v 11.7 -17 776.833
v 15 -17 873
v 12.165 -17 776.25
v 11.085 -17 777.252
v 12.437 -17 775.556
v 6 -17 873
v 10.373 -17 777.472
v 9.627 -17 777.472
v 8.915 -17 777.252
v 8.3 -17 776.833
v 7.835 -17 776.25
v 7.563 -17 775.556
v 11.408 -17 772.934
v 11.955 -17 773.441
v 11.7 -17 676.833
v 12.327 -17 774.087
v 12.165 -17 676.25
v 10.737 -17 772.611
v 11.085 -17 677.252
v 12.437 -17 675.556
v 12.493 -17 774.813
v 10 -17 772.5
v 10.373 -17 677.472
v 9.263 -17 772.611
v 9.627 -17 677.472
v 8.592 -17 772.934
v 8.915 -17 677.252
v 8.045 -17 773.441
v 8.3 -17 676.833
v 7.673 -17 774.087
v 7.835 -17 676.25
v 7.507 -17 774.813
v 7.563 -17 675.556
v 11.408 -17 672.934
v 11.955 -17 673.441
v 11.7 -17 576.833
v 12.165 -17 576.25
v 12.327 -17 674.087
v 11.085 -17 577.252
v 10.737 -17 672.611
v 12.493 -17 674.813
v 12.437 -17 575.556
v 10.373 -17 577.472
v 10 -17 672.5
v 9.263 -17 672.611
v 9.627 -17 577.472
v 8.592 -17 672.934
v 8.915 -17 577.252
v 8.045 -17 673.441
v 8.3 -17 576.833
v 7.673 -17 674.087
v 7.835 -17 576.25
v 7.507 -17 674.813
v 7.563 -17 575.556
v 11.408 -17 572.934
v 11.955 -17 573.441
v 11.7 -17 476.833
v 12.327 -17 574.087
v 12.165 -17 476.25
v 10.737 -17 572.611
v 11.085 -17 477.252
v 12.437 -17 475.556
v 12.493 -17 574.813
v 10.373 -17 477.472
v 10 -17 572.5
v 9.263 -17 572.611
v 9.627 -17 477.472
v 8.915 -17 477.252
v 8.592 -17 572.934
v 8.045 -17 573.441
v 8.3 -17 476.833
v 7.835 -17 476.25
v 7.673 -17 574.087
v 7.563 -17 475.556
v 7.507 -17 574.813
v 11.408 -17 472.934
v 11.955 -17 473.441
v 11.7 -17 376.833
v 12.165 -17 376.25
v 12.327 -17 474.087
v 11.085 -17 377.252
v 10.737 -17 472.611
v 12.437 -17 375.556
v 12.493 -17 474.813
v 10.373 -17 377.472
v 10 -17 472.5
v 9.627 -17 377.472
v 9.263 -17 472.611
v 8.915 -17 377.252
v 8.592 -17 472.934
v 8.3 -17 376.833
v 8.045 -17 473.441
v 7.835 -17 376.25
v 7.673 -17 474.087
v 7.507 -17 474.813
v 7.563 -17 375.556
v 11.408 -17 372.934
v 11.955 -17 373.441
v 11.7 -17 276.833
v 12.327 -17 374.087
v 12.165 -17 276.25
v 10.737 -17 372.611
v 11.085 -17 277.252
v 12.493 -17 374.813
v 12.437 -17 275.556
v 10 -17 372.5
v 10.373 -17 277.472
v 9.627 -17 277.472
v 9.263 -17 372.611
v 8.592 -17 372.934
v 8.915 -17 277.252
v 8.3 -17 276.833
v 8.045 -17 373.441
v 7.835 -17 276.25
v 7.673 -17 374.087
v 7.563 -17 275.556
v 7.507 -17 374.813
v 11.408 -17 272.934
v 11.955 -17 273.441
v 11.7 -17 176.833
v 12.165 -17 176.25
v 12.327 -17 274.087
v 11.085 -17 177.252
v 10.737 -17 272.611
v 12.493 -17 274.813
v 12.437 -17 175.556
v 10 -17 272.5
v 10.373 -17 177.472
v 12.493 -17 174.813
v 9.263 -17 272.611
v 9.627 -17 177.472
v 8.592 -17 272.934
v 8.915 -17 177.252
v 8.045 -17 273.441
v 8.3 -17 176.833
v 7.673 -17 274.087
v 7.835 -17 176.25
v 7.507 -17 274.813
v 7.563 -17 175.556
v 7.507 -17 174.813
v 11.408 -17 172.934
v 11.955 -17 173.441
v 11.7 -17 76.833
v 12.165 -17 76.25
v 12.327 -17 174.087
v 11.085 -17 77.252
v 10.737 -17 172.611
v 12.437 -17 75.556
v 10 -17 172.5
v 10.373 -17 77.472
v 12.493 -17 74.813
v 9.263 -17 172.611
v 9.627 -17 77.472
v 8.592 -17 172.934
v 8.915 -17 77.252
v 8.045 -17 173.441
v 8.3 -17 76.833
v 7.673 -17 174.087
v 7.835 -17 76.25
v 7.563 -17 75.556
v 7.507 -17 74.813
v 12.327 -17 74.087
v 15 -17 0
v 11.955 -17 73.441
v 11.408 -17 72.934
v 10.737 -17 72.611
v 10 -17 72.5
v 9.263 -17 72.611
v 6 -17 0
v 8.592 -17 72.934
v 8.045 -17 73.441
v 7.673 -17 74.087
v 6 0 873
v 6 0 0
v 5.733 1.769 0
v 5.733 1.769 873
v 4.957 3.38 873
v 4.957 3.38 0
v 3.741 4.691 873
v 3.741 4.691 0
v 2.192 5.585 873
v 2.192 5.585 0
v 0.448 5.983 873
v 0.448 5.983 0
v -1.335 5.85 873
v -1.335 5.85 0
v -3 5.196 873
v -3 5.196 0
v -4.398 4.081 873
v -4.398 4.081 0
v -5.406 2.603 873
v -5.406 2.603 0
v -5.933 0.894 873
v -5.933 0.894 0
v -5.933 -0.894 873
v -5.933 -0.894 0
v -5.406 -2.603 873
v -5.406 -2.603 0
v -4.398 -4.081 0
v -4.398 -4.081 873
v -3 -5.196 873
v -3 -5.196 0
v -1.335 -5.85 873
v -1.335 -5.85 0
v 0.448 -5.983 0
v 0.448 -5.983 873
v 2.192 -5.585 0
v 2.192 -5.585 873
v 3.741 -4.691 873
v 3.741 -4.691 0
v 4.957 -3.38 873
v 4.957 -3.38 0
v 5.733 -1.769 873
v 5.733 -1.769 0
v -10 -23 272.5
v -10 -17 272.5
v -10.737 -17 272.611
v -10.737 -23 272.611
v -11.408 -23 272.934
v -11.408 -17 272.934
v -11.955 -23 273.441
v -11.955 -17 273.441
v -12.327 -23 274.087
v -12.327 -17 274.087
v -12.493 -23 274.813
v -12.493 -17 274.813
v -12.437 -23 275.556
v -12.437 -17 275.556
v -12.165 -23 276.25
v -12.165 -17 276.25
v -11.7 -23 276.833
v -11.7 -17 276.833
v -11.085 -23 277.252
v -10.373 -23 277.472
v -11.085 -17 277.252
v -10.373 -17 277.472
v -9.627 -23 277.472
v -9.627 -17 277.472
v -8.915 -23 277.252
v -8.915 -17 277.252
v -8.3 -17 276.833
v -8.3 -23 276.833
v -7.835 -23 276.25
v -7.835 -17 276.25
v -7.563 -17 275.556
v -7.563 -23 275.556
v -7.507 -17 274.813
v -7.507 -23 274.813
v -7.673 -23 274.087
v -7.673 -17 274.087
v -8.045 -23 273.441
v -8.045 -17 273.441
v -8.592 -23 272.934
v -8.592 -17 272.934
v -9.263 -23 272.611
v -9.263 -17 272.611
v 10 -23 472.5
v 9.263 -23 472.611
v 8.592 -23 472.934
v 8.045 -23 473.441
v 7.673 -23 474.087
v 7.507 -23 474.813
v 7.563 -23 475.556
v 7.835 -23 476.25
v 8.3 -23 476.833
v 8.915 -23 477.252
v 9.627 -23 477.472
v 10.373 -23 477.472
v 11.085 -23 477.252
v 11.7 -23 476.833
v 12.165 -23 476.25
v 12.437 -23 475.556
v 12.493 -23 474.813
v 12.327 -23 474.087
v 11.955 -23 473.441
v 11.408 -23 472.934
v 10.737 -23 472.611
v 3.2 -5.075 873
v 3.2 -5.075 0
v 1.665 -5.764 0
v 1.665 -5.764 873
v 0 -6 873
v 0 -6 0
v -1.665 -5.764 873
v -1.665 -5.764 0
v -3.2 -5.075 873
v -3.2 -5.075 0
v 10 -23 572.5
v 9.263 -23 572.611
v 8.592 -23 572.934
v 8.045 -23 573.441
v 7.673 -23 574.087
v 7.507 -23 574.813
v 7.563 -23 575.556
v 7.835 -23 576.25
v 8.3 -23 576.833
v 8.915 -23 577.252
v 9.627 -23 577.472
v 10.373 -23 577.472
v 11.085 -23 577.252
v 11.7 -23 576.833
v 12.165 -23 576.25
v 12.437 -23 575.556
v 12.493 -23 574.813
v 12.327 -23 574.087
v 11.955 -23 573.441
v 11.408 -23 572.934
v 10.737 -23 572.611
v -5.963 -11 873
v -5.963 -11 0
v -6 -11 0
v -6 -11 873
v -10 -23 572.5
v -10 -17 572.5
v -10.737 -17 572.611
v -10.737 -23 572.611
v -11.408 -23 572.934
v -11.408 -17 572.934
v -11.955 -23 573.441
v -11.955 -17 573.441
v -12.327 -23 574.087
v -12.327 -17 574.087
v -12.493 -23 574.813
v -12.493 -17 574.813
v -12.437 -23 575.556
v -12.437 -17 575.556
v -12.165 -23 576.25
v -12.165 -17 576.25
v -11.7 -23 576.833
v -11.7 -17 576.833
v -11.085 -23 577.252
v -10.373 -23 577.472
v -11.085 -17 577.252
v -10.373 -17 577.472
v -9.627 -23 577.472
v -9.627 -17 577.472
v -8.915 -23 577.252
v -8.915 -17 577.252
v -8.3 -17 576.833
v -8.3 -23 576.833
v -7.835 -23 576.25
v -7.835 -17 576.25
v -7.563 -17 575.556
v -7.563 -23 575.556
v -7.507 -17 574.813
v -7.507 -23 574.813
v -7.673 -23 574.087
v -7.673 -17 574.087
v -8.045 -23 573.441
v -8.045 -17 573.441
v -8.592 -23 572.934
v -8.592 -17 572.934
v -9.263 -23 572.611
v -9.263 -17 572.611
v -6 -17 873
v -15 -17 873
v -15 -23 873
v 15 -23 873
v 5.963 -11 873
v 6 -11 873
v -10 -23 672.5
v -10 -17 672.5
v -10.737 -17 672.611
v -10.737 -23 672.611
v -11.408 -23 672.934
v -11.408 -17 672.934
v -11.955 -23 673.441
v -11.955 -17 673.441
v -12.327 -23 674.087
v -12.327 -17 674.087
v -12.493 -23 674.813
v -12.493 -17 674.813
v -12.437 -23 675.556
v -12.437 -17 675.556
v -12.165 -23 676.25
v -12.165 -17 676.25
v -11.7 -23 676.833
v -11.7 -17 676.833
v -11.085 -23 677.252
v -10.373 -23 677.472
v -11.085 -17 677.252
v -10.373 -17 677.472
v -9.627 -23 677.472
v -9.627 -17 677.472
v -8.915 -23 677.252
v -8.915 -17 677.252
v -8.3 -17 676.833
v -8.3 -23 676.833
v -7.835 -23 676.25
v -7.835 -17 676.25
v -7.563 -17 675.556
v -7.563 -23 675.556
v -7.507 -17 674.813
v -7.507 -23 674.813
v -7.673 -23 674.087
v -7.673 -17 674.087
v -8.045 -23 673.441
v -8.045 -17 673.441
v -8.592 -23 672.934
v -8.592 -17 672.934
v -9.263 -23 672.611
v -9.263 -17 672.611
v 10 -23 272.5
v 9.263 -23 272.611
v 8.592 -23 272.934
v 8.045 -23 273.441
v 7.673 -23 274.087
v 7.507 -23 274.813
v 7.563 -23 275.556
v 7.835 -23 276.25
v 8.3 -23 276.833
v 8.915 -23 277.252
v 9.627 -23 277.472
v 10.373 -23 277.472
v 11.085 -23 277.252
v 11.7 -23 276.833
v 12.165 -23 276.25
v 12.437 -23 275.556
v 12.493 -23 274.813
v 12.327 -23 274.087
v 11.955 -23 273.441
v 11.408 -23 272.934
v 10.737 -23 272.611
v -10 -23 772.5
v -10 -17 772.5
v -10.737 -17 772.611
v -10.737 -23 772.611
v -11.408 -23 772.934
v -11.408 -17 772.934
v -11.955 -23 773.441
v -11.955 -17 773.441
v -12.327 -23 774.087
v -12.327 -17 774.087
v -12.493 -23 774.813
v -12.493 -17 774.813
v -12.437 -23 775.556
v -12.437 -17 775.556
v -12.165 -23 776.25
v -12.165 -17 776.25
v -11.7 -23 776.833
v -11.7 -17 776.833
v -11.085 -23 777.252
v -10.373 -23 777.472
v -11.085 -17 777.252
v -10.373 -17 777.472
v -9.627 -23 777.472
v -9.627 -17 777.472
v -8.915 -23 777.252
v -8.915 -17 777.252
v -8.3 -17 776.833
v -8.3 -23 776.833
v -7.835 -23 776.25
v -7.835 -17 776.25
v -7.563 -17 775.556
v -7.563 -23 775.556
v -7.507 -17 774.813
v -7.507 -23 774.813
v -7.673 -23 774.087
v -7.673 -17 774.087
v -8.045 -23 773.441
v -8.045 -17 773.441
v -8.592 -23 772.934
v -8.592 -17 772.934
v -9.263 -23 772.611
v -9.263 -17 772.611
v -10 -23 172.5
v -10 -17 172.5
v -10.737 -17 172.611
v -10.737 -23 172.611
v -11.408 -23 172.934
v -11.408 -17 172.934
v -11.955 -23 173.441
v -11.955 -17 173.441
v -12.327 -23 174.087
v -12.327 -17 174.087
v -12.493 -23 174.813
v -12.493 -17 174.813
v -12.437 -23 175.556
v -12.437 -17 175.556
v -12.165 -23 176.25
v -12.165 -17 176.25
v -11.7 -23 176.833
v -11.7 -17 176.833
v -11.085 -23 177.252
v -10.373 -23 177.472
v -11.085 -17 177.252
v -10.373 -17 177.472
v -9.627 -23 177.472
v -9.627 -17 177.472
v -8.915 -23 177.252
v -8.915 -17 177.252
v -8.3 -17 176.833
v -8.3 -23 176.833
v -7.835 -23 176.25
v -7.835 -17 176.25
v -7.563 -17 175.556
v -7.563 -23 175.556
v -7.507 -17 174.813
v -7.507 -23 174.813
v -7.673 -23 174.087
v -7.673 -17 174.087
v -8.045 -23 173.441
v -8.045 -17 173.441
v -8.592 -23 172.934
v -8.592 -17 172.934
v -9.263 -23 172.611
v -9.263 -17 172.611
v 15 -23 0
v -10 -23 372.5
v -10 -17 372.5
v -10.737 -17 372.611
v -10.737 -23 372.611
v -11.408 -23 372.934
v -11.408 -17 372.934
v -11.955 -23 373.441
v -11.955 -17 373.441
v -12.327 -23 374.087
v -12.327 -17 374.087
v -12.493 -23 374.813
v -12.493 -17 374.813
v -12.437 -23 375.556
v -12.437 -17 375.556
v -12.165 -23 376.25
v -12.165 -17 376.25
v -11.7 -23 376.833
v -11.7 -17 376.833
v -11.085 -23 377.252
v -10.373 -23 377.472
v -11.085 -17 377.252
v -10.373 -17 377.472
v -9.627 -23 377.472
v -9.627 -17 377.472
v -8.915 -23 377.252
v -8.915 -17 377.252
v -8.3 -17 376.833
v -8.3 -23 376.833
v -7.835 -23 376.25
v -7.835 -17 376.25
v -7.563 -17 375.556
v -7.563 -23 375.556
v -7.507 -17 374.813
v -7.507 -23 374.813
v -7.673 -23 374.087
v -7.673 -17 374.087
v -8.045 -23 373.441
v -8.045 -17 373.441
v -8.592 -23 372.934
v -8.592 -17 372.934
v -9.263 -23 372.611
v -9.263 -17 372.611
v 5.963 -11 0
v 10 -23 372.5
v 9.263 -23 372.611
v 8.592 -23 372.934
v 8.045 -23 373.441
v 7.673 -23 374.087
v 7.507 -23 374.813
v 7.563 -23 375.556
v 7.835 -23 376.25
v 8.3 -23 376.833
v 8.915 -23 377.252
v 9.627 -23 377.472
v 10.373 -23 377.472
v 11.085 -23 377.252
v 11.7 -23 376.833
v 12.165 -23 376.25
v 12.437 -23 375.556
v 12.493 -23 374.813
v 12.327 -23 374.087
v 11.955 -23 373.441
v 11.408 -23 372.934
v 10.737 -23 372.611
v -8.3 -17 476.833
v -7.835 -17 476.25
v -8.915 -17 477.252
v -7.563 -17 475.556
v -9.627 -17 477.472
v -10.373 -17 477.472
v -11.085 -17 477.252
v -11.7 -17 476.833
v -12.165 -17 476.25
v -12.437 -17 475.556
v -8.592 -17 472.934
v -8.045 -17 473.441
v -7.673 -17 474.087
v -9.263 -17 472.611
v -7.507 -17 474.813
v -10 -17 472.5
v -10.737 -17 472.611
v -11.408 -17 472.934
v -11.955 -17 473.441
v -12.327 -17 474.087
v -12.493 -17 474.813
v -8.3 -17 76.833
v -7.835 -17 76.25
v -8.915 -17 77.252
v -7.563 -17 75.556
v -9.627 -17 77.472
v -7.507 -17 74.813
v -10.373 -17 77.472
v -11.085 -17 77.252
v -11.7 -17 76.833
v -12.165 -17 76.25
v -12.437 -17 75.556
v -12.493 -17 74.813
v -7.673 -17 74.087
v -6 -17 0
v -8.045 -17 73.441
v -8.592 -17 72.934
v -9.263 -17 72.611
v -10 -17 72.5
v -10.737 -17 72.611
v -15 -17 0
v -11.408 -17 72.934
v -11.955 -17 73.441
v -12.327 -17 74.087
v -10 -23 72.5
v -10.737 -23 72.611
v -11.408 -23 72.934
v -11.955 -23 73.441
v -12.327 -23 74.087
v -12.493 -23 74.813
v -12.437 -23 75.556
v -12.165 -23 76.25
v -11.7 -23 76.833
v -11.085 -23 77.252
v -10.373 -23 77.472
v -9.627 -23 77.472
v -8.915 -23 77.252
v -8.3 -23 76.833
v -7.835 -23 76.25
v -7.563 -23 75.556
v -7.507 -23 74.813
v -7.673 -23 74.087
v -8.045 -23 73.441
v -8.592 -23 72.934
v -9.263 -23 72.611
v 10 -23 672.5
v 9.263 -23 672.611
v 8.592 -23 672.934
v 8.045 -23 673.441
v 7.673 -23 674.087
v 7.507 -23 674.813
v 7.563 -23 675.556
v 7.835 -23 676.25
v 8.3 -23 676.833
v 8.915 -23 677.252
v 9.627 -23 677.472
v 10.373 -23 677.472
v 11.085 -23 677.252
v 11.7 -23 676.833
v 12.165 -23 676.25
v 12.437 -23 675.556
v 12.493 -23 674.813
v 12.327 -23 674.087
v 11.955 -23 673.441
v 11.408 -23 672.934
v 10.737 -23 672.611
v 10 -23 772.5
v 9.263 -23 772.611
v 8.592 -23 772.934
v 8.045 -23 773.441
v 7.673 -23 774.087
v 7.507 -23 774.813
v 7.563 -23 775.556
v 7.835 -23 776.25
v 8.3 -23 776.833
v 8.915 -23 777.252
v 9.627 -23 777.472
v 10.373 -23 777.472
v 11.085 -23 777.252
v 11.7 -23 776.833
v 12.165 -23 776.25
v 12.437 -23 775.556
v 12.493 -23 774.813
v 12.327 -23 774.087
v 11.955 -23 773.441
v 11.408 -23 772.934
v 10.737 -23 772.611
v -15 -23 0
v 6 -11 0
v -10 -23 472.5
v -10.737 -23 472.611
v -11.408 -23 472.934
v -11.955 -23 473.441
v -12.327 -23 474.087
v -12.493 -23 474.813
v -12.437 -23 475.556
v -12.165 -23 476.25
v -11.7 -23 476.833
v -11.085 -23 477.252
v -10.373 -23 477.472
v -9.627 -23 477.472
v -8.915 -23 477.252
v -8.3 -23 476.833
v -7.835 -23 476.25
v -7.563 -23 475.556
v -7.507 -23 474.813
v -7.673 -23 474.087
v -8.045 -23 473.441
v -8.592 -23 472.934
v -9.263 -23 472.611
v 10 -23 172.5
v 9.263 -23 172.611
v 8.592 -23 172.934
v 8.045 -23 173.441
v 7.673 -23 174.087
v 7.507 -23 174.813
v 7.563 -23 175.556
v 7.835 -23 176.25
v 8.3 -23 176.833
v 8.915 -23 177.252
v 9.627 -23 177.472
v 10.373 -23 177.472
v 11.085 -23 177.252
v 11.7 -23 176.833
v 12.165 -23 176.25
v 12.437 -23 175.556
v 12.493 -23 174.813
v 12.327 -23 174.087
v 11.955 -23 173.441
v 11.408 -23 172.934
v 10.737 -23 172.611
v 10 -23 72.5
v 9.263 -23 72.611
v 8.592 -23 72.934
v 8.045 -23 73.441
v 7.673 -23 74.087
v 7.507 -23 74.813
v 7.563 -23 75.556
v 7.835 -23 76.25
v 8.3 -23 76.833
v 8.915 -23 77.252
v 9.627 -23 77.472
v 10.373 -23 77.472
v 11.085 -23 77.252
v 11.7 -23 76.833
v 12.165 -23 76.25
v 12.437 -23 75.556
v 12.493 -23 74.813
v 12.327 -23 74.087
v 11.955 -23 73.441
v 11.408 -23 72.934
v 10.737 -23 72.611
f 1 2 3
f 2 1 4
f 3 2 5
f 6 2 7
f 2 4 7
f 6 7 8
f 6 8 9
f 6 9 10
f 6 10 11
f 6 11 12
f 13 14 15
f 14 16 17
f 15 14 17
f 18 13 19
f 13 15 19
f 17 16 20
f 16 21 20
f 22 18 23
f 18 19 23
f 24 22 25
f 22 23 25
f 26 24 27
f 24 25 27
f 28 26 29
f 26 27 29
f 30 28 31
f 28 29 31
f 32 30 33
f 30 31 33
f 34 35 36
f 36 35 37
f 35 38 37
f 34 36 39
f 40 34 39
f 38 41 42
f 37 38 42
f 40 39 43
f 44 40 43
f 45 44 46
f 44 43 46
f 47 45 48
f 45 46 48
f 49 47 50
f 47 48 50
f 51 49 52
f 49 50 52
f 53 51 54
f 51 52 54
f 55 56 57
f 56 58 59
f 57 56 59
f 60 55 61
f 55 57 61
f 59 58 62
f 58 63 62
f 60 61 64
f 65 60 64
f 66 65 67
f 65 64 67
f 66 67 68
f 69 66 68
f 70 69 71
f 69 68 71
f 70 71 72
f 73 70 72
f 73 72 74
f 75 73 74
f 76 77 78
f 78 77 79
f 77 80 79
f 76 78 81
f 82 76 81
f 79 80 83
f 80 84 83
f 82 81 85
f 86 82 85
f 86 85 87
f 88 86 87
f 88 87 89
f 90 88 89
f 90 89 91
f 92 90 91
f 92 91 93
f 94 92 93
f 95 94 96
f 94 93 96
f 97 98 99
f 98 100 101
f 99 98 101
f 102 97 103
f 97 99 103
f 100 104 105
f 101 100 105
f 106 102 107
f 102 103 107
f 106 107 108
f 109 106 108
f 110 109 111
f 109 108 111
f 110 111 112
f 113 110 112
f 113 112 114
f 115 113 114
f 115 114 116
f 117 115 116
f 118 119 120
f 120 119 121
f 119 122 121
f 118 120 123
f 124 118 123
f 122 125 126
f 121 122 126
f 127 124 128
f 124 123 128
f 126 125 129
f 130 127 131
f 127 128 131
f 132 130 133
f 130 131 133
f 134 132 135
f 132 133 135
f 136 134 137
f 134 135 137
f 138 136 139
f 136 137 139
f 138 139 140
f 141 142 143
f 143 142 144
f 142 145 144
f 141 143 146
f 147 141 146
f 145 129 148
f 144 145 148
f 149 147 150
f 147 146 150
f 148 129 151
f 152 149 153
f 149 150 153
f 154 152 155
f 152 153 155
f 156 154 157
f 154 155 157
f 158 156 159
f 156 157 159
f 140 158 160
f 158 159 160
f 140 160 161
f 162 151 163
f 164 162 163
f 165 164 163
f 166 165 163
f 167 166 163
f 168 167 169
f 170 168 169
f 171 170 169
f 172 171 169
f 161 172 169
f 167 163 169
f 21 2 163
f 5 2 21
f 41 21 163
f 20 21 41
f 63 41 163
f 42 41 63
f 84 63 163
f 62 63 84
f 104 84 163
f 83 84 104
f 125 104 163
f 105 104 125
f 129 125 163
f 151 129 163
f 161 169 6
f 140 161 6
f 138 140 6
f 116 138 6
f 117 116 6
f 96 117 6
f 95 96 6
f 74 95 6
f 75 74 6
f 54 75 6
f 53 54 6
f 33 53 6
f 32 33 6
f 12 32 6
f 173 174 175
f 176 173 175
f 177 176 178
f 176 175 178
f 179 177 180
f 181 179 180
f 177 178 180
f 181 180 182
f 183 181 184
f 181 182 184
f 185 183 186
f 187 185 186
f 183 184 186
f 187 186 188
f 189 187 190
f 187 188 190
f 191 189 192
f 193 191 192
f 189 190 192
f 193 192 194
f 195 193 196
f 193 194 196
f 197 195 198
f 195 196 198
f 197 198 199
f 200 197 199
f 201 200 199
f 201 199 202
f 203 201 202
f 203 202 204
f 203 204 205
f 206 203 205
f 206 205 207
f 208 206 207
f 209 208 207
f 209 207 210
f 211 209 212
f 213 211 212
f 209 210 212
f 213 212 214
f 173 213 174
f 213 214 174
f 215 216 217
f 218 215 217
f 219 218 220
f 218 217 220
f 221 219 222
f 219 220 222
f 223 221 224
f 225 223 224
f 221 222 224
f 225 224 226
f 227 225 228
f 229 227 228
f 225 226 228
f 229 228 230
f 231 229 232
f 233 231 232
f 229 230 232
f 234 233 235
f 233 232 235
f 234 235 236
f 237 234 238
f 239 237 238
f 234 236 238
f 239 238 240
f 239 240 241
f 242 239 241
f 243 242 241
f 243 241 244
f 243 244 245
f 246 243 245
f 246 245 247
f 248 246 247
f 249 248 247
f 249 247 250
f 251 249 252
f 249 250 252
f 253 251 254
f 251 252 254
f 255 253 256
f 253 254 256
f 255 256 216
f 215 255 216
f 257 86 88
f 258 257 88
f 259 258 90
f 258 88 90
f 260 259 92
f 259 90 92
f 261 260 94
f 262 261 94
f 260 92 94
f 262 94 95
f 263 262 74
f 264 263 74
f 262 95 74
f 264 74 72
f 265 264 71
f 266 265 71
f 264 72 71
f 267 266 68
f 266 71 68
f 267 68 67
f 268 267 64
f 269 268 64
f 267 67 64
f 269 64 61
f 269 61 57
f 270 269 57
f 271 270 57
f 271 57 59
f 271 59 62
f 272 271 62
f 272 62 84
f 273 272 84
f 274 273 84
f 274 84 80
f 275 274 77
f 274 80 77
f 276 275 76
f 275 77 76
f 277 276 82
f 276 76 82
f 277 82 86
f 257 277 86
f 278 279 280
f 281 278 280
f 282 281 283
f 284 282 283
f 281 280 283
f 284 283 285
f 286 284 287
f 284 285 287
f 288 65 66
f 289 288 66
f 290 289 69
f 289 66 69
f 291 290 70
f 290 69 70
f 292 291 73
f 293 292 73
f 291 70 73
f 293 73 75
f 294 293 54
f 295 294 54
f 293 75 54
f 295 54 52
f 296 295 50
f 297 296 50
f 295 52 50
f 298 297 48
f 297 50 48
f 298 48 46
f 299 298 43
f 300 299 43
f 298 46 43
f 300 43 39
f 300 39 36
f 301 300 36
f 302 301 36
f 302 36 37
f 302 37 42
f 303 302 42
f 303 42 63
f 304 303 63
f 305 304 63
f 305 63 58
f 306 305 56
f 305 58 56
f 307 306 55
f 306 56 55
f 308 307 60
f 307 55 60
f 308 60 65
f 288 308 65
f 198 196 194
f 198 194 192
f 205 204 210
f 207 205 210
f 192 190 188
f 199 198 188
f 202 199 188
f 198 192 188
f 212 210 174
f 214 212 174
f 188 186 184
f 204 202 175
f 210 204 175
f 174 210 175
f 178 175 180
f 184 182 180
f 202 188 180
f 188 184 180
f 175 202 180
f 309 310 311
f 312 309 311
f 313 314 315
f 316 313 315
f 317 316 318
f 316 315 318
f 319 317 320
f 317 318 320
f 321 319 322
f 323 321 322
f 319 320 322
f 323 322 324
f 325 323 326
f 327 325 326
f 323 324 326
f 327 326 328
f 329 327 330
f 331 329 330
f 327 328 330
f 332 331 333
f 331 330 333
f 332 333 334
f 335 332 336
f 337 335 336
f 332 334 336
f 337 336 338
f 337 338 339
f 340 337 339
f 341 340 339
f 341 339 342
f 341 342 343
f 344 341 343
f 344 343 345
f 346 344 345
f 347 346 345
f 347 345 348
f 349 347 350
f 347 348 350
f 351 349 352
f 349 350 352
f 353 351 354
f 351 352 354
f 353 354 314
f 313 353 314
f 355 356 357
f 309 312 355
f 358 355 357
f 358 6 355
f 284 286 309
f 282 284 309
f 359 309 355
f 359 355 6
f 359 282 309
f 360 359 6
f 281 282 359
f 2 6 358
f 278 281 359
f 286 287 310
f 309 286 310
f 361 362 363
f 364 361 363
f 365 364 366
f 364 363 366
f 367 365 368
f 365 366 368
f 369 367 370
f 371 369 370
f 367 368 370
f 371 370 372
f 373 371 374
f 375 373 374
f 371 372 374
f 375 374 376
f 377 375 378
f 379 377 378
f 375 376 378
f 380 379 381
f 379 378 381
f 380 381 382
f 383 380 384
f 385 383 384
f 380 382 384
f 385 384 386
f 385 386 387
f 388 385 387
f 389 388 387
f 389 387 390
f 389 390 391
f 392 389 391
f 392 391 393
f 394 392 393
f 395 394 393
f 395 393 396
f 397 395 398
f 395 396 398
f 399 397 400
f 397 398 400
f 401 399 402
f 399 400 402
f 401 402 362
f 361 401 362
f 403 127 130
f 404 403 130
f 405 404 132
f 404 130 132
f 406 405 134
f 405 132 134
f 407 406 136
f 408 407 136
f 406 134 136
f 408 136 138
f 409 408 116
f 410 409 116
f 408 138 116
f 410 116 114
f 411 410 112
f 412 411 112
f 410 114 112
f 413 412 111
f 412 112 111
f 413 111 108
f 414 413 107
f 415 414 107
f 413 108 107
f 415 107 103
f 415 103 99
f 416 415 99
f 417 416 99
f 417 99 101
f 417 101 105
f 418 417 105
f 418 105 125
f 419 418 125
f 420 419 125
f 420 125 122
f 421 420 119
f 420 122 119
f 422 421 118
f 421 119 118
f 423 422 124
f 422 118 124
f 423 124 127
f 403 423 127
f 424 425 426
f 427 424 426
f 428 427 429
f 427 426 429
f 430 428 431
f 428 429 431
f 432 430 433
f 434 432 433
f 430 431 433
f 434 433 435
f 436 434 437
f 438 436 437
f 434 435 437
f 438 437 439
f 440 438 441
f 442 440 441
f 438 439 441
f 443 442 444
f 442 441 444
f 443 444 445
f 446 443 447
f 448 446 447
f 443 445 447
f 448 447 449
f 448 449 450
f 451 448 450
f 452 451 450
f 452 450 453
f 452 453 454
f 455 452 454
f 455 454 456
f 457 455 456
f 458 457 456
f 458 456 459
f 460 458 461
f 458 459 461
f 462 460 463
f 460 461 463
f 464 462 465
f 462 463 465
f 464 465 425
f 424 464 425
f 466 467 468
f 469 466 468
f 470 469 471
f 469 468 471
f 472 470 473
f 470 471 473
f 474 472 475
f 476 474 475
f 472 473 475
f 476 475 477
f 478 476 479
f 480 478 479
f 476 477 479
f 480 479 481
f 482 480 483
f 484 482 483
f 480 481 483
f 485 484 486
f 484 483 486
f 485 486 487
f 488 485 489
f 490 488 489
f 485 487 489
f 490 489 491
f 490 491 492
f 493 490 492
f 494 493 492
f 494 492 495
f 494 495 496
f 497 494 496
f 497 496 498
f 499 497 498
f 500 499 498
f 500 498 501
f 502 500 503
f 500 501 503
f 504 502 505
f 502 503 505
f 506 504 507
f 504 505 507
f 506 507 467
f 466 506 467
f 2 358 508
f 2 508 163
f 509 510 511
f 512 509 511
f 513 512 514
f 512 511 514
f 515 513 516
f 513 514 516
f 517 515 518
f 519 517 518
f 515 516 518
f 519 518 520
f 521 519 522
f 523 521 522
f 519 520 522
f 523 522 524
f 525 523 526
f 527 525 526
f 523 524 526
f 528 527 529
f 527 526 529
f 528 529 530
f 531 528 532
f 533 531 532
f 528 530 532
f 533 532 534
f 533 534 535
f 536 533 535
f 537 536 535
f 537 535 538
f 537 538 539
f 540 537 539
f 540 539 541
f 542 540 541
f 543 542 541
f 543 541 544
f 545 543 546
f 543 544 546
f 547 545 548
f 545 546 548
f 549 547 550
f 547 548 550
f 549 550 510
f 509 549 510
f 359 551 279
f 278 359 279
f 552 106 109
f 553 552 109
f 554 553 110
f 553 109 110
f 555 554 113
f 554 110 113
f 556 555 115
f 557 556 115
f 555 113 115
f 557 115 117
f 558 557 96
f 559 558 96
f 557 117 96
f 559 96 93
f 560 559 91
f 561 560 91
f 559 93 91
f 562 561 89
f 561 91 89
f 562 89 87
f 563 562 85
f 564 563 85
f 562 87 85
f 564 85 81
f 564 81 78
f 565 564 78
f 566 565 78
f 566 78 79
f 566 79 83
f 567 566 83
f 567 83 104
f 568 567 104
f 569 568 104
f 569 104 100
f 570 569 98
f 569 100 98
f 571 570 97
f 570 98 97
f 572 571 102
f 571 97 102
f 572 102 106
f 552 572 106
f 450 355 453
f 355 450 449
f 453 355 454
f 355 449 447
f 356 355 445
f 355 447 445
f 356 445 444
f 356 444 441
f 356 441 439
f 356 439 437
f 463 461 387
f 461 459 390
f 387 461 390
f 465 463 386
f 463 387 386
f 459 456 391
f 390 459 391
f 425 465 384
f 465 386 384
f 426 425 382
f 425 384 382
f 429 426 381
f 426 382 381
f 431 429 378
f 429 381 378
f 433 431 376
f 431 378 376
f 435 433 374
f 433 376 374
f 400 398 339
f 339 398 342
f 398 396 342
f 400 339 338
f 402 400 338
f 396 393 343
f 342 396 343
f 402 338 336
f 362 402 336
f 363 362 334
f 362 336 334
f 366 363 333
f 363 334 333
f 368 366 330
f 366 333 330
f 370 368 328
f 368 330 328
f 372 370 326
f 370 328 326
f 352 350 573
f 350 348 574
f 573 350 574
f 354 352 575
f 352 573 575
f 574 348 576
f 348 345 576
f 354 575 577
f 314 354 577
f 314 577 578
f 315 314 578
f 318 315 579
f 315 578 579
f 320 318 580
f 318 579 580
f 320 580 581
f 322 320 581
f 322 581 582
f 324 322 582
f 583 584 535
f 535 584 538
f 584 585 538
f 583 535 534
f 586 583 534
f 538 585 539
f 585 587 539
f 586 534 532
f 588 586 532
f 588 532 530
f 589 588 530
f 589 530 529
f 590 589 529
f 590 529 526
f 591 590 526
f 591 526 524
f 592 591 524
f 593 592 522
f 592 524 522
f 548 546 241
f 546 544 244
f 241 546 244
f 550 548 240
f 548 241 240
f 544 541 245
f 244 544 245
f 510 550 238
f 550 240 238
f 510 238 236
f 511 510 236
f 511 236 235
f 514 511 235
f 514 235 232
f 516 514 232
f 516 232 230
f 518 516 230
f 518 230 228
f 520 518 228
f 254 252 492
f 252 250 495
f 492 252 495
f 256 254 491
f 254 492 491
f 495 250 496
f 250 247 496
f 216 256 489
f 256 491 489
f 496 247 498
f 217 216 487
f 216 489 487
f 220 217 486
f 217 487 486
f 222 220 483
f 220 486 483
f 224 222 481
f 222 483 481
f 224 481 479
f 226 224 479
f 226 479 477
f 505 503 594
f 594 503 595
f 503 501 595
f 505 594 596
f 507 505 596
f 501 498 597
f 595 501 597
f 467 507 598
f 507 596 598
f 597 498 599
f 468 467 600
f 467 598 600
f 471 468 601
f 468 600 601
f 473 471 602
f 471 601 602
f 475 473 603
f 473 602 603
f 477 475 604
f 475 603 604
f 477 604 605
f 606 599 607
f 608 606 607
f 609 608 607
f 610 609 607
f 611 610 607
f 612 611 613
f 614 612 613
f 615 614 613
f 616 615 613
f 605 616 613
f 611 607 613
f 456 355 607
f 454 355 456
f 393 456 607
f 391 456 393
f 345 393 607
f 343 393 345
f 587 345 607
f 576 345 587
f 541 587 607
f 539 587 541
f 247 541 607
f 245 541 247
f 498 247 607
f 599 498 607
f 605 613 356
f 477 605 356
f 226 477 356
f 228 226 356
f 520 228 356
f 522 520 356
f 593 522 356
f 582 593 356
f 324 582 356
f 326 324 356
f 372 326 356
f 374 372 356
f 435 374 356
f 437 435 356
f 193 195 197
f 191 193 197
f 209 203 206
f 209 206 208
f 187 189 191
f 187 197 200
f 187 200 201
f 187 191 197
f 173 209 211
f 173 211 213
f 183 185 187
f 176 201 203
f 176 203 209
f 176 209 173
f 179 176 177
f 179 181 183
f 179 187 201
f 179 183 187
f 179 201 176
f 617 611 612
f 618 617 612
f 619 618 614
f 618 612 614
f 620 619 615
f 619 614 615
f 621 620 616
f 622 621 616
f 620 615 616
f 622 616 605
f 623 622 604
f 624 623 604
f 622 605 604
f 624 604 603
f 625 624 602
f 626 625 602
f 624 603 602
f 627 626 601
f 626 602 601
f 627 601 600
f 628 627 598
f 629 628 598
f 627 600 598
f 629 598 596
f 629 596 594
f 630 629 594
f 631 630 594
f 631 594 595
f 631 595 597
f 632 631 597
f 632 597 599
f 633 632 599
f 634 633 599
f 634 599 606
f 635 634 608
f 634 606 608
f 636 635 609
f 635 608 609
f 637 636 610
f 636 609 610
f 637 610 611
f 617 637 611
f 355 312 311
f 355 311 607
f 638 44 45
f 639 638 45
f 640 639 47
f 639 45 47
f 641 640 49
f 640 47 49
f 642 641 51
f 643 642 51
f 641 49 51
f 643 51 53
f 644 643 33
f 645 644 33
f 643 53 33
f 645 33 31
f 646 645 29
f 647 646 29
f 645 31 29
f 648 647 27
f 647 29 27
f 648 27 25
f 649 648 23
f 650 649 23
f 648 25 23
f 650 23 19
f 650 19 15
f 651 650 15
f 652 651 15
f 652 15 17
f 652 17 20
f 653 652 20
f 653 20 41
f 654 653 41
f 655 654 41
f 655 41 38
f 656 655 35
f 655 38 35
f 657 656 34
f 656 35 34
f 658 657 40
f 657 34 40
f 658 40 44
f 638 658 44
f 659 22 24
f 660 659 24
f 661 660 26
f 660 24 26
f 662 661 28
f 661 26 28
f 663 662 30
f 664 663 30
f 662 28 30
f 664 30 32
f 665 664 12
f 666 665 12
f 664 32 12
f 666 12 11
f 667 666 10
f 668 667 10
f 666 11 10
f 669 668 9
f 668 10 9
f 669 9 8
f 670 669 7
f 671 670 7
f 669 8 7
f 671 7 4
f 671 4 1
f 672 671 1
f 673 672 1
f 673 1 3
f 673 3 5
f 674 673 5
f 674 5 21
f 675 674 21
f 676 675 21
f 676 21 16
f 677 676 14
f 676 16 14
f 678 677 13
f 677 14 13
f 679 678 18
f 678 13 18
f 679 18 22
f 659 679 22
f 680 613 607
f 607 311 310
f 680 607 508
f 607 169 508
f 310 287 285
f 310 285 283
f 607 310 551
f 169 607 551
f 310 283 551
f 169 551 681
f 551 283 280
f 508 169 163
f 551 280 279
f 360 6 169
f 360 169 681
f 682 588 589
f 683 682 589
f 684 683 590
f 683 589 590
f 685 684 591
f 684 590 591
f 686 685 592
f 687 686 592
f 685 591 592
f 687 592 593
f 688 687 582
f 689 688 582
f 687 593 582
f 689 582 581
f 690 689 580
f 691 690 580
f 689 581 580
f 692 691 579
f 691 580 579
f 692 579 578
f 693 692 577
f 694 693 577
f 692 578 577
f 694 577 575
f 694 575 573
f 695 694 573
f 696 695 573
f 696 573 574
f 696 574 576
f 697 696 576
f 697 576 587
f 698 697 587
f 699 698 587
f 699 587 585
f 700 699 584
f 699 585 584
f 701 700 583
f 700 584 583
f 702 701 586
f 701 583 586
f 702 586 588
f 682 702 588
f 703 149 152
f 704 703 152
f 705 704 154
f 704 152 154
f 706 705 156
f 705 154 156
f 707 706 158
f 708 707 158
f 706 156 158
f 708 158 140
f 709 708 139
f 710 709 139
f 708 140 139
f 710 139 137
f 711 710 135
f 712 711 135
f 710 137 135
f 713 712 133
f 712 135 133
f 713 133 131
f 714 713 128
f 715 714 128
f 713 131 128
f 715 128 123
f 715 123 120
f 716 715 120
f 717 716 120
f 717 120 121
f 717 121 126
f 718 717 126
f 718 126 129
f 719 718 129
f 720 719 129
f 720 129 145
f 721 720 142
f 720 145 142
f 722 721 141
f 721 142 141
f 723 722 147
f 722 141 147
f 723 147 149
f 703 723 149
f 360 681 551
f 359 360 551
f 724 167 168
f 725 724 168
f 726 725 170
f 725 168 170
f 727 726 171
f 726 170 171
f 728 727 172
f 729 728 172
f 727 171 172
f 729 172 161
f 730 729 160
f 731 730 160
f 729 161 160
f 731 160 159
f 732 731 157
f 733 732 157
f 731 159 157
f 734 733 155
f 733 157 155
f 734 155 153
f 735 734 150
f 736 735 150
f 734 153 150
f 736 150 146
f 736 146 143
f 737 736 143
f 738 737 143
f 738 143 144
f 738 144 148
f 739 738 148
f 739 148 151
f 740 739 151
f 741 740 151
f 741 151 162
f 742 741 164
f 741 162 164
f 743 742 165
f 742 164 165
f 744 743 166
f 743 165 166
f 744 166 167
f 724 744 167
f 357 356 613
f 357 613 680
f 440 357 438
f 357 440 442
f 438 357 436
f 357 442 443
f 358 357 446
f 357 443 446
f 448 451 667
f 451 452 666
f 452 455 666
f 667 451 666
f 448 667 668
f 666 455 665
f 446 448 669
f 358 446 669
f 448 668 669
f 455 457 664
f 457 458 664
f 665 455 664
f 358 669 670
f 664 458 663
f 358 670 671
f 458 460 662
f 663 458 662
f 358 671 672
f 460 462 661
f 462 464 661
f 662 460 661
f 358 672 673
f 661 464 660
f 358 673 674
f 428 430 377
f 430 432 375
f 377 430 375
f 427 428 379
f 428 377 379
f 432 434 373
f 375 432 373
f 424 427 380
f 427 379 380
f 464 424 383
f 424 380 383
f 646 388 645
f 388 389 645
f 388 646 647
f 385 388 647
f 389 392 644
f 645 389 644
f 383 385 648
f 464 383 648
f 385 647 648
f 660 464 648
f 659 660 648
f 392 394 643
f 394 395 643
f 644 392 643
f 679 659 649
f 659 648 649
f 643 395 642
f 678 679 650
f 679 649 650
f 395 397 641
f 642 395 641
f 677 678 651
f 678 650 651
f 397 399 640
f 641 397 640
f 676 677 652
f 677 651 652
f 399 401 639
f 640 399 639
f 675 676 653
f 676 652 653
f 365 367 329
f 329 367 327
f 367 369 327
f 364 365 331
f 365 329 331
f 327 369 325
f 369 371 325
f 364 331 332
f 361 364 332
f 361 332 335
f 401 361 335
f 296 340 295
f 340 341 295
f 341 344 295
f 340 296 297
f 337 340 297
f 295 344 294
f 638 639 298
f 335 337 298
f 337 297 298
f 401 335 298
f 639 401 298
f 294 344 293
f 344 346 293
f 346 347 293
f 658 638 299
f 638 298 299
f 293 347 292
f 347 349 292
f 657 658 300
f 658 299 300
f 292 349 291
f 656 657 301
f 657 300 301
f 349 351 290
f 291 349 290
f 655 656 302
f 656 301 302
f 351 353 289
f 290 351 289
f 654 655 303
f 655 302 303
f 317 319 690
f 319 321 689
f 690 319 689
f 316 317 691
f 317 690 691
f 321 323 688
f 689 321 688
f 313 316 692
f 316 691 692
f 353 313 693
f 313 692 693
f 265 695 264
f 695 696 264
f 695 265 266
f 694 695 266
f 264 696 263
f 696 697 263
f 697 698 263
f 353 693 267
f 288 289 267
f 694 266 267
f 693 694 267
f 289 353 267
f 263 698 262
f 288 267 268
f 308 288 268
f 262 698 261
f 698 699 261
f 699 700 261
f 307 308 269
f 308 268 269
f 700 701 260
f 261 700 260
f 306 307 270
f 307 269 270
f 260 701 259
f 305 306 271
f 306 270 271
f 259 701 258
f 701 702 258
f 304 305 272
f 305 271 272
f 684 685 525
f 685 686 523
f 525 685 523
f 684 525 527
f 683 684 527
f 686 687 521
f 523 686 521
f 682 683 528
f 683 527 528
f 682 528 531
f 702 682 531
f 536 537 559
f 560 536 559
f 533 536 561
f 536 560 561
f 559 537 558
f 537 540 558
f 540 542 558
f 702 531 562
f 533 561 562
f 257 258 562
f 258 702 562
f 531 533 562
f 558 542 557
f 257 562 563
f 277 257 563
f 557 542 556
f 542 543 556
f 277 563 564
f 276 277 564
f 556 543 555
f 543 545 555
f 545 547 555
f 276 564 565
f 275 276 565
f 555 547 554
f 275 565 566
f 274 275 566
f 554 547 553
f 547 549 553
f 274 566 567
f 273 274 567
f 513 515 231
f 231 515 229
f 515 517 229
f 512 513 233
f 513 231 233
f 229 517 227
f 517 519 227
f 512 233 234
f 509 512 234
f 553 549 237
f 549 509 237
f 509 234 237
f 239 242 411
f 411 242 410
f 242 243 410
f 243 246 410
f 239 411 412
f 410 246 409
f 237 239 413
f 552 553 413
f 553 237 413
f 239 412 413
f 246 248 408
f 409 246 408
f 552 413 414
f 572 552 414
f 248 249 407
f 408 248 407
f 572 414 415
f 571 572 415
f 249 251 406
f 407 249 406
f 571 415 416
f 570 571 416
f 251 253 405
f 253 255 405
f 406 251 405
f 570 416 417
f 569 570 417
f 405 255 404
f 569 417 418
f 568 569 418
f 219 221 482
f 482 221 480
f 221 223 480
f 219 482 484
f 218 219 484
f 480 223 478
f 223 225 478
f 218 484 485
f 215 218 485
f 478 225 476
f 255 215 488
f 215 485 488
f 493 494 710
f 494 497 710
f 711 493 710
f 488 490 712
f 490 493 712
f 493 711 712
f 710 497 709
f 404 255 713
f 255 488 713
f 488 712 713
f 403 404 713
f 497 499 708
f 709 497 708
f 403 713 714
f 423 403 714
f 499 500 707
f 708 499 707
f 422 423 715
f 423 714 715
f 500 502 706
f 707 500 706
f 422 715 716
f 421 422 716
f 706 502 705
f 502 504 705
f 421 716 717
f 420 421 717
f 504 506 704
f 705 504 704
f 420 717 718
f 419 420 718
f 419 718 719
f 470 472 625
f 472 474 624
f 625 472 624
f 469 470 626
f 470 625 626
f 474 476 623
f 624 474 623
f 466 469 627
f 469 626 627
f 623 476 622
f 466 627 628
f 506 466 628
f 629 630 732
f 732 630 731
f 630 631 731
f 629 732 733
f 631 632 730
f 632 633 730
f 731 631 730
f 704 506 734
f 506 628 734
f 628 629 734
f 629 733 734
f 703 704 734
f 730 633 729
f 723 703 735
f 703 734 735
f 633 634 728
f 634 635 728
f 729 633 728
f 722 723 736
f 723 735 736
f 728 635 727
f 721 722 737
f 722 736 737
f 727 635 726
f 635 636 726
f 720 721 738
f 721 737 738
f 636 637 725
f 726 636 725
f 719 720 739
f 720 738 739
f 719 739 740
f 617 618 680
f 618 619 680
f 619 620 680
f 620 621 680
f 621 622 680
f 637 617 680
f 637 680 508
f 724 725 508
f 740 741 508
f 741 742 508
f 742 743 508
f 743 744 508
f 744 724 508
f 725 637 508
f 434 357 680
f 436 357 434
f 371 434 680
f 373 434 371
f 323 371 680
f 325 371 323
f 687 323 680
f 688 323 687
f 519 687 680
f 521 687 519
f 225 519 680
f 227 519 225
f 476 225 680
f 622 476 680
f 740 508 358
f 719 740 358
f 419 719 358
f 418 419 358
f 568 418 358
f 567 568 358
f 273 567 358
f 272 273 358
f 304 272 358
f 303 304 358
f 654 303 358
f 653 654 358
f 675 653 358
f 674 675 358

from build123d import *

# Parameters (mm, degrees)
SBS_PROFILE_R             = 6
STEELRAIL_DEPTH           = 873
ALUMINUMSUPPORT_DEPTH     = 873
HOLEDIA_W                 = 2.5
HOLEDIA_H                 = 6.001
MOUNTHOLES_AT_2_COUNT     = 2
MOUNTHOLES_AT_2_PITCH     = 20
LPATTERN1_COUNT           = 8
LPATTERN1_PITCH           = 100
LPATTERN1_COPY_1_SKETCH_W = 2.5
LPATTERN1_COPY_1_SKETCH_H = 6.001
LPATTERN1_COPY_2_SKETCH_W = 2.5
LPATTERN1_COPY_2_SKETCH_H = 6.001
LPATTERN1_COPY_3_SKETCH_W = 2.5
LPATTERN1_COPY_3_SKETCH_H = 6.001
LPATTERN1_COPY_4_SKETCH_W = 2.5
LPATTERN1_COPY_4_SKETCH_H = 6.001
LPATTERN1_COPY_5_SKETCH_W = 2.5
LPATTERN1_COPY_5_SKETCH_H = 6.001
LPATTERN1_COPY_6_SKETCH_W = 2.5
LPATTERN1_COPY_6_SKETCH_H = 6.001
LPATTERN1_COPY_7_SKETCH_W = 2.5
LPATTERN1_COPY_7_SKETCH_H = 6.001


with BuildPart() as part:
    # SBS-Profile → SteelRail (new body)
    with BuildSketch(Plane.XY):
        Circle(SBS_PROFILE_R)
    extrude(amount=STEELRAIL_DEPTH)


with BuildPart() as body_2:
    # SBS-Profile<3> → AluminumSupport (new body)
    with BuildSketch(Plane.XY):
        with BuildLine():
            Line((-15, -17), (-15, -23))
            Line((-15, -23), (15, -23))
            Line((15, -23), (15, -17))
            Line((15, -17), (6, -17))
            Line((6, -17), (6, -11))
            Line((6, -11), (5.962671888, -11))
            Line((5.962671888, -11), (3.2, -5.075431016))
            ThreePointArc((3.2, -5.075431016), (0, -6), (-3.2, -5.075431016))
            Line((-3.2, -5.075431016), (-5.962671888, -11))
            Line((-5.962671888, -11), (-6, -11))
            Line((-6, -11), (-6, -17))
            Line((-6, -17), (-15, -17))
        make_face()
    extrude(amount=ALUMINUMSUPPORT_DEPTH)

    # HoleDia → MountHoles (revolve, cut)
    with BuildSketch(Plane(origin=(10, -23, 75), x_dir=(0, 0, -1), z_dir=(1, 0, 0))):
        with Locations((1.25, 3.0005)):
            Rectangle(HOLEDIA_W, HOLEDIA_H)
    mountholes = revolve(axis=Axis((10, -29.35, 75), (0, 1, 0)), mode=Mode.SUBTRACT)

    # MountHoles at 2: MountHoles ×2
    with Locations(*[(-i * MOUNTHOLES_AT_2_PITCH, 0, 0) for i in range(1, MOUNTHOLES_AT_2_COUNT)]):
        add(mountholes, mode=Mode.SUBTRACT)

    # LPattern1: MountHoles ×8
    with Locations(*[(0, 0, i * LPATTERN1_PITCH) for i in range(1, LPATTERN1_COUNT)]):
        add(mountholes, mode=Mode.SUBTRACT)

    # LPattern1 copy 1 sketch → LPattern1 copy 1 (revolve, cut)
    with BuildSketch(Plane(origin=(-10, -23, 175), x_dir=(0, 0, -1), z_dir=(1, 0, 0))):
        with Locations((1.25, 3.0005)):
            Rectangle(LPATTERN1_COPY_1_SKETCH_W, LPATTERN1_COPY_1_SKETCH_H)
    revolve(axis=Axis((-10, -29.35, 175), (0, 1, 0)), mode=Mode.SUBTRACT)

    # LPattern1 copy 2 sketch → LPattern1 copy 2 (revolve, cut)
    with BuildSketch(Plane(origin=(-10, -23, 275), x_dir=(0, 0, -1), z_dir=(1, 0, 0))):
        with Locations((1.25, 3.0005)):
            Rectangle(LPATTERN1_COPY_2_SKETCH_W, LPATTERN1_COPY_2_SKETCH_H)
    revolve(axis=Axis((-10, -29.35, 275), (0, 1, 0)), mode=Mode.SUBTRACT)

    # LPattern1 copy 3 sketch → LPattern1 copy 3 (revolve, cut)
    with BuildSketch(Plane(origin=(-10, -23, 375), x_dir=(0, 0, -1), z_dir=(1, 0, 0))):
        with Locations((1.25, 3.0005)):
            Rectangle(LPATTERN1_COPY_3_SKETCH_W, LPATTERN1_COPY_3_SKETCH_H)
    revolve(axis=Axis((-10, -29.35, 375), (0, 1, 0)), mode=Mode.SUBTRACT)

    # LPattern1 copy 4 sketch → LPattern1 copy 4 (revolve, cut)
    with BuildSketch(Plane(origin=(-10, -23, 475), x_dir=(0, 0, -1), z_dir=(1, 0, 0))):
        with Locations((1.25, 3.0005)):
            Rectangle(LPATTERN1_COPY_4_SKETCH_W, LPATTERN1_COPY_4_SKETCH_H)
    revolve(axis=Axis((-10, -29.35, 475), (0, 1, 0)), mode=Mode.SUBTRACT)

    # LPattern1 copy 5 sketch → LPattern1 copy 5 (revolve, cut)
    with BuildSketch(Plane(origin=(-10, -23, 575), x_dir=(0, 0, -1), z_dir=(1, 0, 0))):
        with Locations((1.25, 3.0005)):
            Rectangle(LPATTERN1_COPY_5_SKETCH_W, LPATTERN1_COPY_5_SKETCH_H)
    revolve(axis=Axis((-10, -29.35, 575), (0, 1, 0)), mode=Mode.SUBTRACT)

    # LPattern1 copy 6 sketch → LPattern1 copy 6 (revolve, cut)
    with BuildSketch(Plane(origin=(-10, -23, 675), x_dir=(0, 0, -1), z_dir=(1, 0, 0))):
        with Locations((1.25, 3.0005)):
            Rectangle(LPATTERN1_COPY_6_SKETCH_W, LPATTERN1_COPY_6_SKETCH_H)
    revolve(axis=Axis((-10, -29.35, 675), (0, 1, 0)), mode=Mode.SUBTRACT)

    # LPattern1 copy 7 sketch → LPattern1 copy 7 (revolve, cut)
    with BuildSketch(Plane(origin=(-10, -23, 775), x_dir=(0, 0, -1), z_dir=(1, 0, 0))):
        with Locations((1.25, 3.0005)):
            Rectangle(LPATTERN1_COPY_7_SKETCH_W, LPATTERN1_COPY_7_SKETCH_H)
    revolve(axis=Axis((-10, -29.35, 775), (0, 1, 0)), mode=Mode.SUBTRACT)


solid = Compound([part.part, body_2.part])
